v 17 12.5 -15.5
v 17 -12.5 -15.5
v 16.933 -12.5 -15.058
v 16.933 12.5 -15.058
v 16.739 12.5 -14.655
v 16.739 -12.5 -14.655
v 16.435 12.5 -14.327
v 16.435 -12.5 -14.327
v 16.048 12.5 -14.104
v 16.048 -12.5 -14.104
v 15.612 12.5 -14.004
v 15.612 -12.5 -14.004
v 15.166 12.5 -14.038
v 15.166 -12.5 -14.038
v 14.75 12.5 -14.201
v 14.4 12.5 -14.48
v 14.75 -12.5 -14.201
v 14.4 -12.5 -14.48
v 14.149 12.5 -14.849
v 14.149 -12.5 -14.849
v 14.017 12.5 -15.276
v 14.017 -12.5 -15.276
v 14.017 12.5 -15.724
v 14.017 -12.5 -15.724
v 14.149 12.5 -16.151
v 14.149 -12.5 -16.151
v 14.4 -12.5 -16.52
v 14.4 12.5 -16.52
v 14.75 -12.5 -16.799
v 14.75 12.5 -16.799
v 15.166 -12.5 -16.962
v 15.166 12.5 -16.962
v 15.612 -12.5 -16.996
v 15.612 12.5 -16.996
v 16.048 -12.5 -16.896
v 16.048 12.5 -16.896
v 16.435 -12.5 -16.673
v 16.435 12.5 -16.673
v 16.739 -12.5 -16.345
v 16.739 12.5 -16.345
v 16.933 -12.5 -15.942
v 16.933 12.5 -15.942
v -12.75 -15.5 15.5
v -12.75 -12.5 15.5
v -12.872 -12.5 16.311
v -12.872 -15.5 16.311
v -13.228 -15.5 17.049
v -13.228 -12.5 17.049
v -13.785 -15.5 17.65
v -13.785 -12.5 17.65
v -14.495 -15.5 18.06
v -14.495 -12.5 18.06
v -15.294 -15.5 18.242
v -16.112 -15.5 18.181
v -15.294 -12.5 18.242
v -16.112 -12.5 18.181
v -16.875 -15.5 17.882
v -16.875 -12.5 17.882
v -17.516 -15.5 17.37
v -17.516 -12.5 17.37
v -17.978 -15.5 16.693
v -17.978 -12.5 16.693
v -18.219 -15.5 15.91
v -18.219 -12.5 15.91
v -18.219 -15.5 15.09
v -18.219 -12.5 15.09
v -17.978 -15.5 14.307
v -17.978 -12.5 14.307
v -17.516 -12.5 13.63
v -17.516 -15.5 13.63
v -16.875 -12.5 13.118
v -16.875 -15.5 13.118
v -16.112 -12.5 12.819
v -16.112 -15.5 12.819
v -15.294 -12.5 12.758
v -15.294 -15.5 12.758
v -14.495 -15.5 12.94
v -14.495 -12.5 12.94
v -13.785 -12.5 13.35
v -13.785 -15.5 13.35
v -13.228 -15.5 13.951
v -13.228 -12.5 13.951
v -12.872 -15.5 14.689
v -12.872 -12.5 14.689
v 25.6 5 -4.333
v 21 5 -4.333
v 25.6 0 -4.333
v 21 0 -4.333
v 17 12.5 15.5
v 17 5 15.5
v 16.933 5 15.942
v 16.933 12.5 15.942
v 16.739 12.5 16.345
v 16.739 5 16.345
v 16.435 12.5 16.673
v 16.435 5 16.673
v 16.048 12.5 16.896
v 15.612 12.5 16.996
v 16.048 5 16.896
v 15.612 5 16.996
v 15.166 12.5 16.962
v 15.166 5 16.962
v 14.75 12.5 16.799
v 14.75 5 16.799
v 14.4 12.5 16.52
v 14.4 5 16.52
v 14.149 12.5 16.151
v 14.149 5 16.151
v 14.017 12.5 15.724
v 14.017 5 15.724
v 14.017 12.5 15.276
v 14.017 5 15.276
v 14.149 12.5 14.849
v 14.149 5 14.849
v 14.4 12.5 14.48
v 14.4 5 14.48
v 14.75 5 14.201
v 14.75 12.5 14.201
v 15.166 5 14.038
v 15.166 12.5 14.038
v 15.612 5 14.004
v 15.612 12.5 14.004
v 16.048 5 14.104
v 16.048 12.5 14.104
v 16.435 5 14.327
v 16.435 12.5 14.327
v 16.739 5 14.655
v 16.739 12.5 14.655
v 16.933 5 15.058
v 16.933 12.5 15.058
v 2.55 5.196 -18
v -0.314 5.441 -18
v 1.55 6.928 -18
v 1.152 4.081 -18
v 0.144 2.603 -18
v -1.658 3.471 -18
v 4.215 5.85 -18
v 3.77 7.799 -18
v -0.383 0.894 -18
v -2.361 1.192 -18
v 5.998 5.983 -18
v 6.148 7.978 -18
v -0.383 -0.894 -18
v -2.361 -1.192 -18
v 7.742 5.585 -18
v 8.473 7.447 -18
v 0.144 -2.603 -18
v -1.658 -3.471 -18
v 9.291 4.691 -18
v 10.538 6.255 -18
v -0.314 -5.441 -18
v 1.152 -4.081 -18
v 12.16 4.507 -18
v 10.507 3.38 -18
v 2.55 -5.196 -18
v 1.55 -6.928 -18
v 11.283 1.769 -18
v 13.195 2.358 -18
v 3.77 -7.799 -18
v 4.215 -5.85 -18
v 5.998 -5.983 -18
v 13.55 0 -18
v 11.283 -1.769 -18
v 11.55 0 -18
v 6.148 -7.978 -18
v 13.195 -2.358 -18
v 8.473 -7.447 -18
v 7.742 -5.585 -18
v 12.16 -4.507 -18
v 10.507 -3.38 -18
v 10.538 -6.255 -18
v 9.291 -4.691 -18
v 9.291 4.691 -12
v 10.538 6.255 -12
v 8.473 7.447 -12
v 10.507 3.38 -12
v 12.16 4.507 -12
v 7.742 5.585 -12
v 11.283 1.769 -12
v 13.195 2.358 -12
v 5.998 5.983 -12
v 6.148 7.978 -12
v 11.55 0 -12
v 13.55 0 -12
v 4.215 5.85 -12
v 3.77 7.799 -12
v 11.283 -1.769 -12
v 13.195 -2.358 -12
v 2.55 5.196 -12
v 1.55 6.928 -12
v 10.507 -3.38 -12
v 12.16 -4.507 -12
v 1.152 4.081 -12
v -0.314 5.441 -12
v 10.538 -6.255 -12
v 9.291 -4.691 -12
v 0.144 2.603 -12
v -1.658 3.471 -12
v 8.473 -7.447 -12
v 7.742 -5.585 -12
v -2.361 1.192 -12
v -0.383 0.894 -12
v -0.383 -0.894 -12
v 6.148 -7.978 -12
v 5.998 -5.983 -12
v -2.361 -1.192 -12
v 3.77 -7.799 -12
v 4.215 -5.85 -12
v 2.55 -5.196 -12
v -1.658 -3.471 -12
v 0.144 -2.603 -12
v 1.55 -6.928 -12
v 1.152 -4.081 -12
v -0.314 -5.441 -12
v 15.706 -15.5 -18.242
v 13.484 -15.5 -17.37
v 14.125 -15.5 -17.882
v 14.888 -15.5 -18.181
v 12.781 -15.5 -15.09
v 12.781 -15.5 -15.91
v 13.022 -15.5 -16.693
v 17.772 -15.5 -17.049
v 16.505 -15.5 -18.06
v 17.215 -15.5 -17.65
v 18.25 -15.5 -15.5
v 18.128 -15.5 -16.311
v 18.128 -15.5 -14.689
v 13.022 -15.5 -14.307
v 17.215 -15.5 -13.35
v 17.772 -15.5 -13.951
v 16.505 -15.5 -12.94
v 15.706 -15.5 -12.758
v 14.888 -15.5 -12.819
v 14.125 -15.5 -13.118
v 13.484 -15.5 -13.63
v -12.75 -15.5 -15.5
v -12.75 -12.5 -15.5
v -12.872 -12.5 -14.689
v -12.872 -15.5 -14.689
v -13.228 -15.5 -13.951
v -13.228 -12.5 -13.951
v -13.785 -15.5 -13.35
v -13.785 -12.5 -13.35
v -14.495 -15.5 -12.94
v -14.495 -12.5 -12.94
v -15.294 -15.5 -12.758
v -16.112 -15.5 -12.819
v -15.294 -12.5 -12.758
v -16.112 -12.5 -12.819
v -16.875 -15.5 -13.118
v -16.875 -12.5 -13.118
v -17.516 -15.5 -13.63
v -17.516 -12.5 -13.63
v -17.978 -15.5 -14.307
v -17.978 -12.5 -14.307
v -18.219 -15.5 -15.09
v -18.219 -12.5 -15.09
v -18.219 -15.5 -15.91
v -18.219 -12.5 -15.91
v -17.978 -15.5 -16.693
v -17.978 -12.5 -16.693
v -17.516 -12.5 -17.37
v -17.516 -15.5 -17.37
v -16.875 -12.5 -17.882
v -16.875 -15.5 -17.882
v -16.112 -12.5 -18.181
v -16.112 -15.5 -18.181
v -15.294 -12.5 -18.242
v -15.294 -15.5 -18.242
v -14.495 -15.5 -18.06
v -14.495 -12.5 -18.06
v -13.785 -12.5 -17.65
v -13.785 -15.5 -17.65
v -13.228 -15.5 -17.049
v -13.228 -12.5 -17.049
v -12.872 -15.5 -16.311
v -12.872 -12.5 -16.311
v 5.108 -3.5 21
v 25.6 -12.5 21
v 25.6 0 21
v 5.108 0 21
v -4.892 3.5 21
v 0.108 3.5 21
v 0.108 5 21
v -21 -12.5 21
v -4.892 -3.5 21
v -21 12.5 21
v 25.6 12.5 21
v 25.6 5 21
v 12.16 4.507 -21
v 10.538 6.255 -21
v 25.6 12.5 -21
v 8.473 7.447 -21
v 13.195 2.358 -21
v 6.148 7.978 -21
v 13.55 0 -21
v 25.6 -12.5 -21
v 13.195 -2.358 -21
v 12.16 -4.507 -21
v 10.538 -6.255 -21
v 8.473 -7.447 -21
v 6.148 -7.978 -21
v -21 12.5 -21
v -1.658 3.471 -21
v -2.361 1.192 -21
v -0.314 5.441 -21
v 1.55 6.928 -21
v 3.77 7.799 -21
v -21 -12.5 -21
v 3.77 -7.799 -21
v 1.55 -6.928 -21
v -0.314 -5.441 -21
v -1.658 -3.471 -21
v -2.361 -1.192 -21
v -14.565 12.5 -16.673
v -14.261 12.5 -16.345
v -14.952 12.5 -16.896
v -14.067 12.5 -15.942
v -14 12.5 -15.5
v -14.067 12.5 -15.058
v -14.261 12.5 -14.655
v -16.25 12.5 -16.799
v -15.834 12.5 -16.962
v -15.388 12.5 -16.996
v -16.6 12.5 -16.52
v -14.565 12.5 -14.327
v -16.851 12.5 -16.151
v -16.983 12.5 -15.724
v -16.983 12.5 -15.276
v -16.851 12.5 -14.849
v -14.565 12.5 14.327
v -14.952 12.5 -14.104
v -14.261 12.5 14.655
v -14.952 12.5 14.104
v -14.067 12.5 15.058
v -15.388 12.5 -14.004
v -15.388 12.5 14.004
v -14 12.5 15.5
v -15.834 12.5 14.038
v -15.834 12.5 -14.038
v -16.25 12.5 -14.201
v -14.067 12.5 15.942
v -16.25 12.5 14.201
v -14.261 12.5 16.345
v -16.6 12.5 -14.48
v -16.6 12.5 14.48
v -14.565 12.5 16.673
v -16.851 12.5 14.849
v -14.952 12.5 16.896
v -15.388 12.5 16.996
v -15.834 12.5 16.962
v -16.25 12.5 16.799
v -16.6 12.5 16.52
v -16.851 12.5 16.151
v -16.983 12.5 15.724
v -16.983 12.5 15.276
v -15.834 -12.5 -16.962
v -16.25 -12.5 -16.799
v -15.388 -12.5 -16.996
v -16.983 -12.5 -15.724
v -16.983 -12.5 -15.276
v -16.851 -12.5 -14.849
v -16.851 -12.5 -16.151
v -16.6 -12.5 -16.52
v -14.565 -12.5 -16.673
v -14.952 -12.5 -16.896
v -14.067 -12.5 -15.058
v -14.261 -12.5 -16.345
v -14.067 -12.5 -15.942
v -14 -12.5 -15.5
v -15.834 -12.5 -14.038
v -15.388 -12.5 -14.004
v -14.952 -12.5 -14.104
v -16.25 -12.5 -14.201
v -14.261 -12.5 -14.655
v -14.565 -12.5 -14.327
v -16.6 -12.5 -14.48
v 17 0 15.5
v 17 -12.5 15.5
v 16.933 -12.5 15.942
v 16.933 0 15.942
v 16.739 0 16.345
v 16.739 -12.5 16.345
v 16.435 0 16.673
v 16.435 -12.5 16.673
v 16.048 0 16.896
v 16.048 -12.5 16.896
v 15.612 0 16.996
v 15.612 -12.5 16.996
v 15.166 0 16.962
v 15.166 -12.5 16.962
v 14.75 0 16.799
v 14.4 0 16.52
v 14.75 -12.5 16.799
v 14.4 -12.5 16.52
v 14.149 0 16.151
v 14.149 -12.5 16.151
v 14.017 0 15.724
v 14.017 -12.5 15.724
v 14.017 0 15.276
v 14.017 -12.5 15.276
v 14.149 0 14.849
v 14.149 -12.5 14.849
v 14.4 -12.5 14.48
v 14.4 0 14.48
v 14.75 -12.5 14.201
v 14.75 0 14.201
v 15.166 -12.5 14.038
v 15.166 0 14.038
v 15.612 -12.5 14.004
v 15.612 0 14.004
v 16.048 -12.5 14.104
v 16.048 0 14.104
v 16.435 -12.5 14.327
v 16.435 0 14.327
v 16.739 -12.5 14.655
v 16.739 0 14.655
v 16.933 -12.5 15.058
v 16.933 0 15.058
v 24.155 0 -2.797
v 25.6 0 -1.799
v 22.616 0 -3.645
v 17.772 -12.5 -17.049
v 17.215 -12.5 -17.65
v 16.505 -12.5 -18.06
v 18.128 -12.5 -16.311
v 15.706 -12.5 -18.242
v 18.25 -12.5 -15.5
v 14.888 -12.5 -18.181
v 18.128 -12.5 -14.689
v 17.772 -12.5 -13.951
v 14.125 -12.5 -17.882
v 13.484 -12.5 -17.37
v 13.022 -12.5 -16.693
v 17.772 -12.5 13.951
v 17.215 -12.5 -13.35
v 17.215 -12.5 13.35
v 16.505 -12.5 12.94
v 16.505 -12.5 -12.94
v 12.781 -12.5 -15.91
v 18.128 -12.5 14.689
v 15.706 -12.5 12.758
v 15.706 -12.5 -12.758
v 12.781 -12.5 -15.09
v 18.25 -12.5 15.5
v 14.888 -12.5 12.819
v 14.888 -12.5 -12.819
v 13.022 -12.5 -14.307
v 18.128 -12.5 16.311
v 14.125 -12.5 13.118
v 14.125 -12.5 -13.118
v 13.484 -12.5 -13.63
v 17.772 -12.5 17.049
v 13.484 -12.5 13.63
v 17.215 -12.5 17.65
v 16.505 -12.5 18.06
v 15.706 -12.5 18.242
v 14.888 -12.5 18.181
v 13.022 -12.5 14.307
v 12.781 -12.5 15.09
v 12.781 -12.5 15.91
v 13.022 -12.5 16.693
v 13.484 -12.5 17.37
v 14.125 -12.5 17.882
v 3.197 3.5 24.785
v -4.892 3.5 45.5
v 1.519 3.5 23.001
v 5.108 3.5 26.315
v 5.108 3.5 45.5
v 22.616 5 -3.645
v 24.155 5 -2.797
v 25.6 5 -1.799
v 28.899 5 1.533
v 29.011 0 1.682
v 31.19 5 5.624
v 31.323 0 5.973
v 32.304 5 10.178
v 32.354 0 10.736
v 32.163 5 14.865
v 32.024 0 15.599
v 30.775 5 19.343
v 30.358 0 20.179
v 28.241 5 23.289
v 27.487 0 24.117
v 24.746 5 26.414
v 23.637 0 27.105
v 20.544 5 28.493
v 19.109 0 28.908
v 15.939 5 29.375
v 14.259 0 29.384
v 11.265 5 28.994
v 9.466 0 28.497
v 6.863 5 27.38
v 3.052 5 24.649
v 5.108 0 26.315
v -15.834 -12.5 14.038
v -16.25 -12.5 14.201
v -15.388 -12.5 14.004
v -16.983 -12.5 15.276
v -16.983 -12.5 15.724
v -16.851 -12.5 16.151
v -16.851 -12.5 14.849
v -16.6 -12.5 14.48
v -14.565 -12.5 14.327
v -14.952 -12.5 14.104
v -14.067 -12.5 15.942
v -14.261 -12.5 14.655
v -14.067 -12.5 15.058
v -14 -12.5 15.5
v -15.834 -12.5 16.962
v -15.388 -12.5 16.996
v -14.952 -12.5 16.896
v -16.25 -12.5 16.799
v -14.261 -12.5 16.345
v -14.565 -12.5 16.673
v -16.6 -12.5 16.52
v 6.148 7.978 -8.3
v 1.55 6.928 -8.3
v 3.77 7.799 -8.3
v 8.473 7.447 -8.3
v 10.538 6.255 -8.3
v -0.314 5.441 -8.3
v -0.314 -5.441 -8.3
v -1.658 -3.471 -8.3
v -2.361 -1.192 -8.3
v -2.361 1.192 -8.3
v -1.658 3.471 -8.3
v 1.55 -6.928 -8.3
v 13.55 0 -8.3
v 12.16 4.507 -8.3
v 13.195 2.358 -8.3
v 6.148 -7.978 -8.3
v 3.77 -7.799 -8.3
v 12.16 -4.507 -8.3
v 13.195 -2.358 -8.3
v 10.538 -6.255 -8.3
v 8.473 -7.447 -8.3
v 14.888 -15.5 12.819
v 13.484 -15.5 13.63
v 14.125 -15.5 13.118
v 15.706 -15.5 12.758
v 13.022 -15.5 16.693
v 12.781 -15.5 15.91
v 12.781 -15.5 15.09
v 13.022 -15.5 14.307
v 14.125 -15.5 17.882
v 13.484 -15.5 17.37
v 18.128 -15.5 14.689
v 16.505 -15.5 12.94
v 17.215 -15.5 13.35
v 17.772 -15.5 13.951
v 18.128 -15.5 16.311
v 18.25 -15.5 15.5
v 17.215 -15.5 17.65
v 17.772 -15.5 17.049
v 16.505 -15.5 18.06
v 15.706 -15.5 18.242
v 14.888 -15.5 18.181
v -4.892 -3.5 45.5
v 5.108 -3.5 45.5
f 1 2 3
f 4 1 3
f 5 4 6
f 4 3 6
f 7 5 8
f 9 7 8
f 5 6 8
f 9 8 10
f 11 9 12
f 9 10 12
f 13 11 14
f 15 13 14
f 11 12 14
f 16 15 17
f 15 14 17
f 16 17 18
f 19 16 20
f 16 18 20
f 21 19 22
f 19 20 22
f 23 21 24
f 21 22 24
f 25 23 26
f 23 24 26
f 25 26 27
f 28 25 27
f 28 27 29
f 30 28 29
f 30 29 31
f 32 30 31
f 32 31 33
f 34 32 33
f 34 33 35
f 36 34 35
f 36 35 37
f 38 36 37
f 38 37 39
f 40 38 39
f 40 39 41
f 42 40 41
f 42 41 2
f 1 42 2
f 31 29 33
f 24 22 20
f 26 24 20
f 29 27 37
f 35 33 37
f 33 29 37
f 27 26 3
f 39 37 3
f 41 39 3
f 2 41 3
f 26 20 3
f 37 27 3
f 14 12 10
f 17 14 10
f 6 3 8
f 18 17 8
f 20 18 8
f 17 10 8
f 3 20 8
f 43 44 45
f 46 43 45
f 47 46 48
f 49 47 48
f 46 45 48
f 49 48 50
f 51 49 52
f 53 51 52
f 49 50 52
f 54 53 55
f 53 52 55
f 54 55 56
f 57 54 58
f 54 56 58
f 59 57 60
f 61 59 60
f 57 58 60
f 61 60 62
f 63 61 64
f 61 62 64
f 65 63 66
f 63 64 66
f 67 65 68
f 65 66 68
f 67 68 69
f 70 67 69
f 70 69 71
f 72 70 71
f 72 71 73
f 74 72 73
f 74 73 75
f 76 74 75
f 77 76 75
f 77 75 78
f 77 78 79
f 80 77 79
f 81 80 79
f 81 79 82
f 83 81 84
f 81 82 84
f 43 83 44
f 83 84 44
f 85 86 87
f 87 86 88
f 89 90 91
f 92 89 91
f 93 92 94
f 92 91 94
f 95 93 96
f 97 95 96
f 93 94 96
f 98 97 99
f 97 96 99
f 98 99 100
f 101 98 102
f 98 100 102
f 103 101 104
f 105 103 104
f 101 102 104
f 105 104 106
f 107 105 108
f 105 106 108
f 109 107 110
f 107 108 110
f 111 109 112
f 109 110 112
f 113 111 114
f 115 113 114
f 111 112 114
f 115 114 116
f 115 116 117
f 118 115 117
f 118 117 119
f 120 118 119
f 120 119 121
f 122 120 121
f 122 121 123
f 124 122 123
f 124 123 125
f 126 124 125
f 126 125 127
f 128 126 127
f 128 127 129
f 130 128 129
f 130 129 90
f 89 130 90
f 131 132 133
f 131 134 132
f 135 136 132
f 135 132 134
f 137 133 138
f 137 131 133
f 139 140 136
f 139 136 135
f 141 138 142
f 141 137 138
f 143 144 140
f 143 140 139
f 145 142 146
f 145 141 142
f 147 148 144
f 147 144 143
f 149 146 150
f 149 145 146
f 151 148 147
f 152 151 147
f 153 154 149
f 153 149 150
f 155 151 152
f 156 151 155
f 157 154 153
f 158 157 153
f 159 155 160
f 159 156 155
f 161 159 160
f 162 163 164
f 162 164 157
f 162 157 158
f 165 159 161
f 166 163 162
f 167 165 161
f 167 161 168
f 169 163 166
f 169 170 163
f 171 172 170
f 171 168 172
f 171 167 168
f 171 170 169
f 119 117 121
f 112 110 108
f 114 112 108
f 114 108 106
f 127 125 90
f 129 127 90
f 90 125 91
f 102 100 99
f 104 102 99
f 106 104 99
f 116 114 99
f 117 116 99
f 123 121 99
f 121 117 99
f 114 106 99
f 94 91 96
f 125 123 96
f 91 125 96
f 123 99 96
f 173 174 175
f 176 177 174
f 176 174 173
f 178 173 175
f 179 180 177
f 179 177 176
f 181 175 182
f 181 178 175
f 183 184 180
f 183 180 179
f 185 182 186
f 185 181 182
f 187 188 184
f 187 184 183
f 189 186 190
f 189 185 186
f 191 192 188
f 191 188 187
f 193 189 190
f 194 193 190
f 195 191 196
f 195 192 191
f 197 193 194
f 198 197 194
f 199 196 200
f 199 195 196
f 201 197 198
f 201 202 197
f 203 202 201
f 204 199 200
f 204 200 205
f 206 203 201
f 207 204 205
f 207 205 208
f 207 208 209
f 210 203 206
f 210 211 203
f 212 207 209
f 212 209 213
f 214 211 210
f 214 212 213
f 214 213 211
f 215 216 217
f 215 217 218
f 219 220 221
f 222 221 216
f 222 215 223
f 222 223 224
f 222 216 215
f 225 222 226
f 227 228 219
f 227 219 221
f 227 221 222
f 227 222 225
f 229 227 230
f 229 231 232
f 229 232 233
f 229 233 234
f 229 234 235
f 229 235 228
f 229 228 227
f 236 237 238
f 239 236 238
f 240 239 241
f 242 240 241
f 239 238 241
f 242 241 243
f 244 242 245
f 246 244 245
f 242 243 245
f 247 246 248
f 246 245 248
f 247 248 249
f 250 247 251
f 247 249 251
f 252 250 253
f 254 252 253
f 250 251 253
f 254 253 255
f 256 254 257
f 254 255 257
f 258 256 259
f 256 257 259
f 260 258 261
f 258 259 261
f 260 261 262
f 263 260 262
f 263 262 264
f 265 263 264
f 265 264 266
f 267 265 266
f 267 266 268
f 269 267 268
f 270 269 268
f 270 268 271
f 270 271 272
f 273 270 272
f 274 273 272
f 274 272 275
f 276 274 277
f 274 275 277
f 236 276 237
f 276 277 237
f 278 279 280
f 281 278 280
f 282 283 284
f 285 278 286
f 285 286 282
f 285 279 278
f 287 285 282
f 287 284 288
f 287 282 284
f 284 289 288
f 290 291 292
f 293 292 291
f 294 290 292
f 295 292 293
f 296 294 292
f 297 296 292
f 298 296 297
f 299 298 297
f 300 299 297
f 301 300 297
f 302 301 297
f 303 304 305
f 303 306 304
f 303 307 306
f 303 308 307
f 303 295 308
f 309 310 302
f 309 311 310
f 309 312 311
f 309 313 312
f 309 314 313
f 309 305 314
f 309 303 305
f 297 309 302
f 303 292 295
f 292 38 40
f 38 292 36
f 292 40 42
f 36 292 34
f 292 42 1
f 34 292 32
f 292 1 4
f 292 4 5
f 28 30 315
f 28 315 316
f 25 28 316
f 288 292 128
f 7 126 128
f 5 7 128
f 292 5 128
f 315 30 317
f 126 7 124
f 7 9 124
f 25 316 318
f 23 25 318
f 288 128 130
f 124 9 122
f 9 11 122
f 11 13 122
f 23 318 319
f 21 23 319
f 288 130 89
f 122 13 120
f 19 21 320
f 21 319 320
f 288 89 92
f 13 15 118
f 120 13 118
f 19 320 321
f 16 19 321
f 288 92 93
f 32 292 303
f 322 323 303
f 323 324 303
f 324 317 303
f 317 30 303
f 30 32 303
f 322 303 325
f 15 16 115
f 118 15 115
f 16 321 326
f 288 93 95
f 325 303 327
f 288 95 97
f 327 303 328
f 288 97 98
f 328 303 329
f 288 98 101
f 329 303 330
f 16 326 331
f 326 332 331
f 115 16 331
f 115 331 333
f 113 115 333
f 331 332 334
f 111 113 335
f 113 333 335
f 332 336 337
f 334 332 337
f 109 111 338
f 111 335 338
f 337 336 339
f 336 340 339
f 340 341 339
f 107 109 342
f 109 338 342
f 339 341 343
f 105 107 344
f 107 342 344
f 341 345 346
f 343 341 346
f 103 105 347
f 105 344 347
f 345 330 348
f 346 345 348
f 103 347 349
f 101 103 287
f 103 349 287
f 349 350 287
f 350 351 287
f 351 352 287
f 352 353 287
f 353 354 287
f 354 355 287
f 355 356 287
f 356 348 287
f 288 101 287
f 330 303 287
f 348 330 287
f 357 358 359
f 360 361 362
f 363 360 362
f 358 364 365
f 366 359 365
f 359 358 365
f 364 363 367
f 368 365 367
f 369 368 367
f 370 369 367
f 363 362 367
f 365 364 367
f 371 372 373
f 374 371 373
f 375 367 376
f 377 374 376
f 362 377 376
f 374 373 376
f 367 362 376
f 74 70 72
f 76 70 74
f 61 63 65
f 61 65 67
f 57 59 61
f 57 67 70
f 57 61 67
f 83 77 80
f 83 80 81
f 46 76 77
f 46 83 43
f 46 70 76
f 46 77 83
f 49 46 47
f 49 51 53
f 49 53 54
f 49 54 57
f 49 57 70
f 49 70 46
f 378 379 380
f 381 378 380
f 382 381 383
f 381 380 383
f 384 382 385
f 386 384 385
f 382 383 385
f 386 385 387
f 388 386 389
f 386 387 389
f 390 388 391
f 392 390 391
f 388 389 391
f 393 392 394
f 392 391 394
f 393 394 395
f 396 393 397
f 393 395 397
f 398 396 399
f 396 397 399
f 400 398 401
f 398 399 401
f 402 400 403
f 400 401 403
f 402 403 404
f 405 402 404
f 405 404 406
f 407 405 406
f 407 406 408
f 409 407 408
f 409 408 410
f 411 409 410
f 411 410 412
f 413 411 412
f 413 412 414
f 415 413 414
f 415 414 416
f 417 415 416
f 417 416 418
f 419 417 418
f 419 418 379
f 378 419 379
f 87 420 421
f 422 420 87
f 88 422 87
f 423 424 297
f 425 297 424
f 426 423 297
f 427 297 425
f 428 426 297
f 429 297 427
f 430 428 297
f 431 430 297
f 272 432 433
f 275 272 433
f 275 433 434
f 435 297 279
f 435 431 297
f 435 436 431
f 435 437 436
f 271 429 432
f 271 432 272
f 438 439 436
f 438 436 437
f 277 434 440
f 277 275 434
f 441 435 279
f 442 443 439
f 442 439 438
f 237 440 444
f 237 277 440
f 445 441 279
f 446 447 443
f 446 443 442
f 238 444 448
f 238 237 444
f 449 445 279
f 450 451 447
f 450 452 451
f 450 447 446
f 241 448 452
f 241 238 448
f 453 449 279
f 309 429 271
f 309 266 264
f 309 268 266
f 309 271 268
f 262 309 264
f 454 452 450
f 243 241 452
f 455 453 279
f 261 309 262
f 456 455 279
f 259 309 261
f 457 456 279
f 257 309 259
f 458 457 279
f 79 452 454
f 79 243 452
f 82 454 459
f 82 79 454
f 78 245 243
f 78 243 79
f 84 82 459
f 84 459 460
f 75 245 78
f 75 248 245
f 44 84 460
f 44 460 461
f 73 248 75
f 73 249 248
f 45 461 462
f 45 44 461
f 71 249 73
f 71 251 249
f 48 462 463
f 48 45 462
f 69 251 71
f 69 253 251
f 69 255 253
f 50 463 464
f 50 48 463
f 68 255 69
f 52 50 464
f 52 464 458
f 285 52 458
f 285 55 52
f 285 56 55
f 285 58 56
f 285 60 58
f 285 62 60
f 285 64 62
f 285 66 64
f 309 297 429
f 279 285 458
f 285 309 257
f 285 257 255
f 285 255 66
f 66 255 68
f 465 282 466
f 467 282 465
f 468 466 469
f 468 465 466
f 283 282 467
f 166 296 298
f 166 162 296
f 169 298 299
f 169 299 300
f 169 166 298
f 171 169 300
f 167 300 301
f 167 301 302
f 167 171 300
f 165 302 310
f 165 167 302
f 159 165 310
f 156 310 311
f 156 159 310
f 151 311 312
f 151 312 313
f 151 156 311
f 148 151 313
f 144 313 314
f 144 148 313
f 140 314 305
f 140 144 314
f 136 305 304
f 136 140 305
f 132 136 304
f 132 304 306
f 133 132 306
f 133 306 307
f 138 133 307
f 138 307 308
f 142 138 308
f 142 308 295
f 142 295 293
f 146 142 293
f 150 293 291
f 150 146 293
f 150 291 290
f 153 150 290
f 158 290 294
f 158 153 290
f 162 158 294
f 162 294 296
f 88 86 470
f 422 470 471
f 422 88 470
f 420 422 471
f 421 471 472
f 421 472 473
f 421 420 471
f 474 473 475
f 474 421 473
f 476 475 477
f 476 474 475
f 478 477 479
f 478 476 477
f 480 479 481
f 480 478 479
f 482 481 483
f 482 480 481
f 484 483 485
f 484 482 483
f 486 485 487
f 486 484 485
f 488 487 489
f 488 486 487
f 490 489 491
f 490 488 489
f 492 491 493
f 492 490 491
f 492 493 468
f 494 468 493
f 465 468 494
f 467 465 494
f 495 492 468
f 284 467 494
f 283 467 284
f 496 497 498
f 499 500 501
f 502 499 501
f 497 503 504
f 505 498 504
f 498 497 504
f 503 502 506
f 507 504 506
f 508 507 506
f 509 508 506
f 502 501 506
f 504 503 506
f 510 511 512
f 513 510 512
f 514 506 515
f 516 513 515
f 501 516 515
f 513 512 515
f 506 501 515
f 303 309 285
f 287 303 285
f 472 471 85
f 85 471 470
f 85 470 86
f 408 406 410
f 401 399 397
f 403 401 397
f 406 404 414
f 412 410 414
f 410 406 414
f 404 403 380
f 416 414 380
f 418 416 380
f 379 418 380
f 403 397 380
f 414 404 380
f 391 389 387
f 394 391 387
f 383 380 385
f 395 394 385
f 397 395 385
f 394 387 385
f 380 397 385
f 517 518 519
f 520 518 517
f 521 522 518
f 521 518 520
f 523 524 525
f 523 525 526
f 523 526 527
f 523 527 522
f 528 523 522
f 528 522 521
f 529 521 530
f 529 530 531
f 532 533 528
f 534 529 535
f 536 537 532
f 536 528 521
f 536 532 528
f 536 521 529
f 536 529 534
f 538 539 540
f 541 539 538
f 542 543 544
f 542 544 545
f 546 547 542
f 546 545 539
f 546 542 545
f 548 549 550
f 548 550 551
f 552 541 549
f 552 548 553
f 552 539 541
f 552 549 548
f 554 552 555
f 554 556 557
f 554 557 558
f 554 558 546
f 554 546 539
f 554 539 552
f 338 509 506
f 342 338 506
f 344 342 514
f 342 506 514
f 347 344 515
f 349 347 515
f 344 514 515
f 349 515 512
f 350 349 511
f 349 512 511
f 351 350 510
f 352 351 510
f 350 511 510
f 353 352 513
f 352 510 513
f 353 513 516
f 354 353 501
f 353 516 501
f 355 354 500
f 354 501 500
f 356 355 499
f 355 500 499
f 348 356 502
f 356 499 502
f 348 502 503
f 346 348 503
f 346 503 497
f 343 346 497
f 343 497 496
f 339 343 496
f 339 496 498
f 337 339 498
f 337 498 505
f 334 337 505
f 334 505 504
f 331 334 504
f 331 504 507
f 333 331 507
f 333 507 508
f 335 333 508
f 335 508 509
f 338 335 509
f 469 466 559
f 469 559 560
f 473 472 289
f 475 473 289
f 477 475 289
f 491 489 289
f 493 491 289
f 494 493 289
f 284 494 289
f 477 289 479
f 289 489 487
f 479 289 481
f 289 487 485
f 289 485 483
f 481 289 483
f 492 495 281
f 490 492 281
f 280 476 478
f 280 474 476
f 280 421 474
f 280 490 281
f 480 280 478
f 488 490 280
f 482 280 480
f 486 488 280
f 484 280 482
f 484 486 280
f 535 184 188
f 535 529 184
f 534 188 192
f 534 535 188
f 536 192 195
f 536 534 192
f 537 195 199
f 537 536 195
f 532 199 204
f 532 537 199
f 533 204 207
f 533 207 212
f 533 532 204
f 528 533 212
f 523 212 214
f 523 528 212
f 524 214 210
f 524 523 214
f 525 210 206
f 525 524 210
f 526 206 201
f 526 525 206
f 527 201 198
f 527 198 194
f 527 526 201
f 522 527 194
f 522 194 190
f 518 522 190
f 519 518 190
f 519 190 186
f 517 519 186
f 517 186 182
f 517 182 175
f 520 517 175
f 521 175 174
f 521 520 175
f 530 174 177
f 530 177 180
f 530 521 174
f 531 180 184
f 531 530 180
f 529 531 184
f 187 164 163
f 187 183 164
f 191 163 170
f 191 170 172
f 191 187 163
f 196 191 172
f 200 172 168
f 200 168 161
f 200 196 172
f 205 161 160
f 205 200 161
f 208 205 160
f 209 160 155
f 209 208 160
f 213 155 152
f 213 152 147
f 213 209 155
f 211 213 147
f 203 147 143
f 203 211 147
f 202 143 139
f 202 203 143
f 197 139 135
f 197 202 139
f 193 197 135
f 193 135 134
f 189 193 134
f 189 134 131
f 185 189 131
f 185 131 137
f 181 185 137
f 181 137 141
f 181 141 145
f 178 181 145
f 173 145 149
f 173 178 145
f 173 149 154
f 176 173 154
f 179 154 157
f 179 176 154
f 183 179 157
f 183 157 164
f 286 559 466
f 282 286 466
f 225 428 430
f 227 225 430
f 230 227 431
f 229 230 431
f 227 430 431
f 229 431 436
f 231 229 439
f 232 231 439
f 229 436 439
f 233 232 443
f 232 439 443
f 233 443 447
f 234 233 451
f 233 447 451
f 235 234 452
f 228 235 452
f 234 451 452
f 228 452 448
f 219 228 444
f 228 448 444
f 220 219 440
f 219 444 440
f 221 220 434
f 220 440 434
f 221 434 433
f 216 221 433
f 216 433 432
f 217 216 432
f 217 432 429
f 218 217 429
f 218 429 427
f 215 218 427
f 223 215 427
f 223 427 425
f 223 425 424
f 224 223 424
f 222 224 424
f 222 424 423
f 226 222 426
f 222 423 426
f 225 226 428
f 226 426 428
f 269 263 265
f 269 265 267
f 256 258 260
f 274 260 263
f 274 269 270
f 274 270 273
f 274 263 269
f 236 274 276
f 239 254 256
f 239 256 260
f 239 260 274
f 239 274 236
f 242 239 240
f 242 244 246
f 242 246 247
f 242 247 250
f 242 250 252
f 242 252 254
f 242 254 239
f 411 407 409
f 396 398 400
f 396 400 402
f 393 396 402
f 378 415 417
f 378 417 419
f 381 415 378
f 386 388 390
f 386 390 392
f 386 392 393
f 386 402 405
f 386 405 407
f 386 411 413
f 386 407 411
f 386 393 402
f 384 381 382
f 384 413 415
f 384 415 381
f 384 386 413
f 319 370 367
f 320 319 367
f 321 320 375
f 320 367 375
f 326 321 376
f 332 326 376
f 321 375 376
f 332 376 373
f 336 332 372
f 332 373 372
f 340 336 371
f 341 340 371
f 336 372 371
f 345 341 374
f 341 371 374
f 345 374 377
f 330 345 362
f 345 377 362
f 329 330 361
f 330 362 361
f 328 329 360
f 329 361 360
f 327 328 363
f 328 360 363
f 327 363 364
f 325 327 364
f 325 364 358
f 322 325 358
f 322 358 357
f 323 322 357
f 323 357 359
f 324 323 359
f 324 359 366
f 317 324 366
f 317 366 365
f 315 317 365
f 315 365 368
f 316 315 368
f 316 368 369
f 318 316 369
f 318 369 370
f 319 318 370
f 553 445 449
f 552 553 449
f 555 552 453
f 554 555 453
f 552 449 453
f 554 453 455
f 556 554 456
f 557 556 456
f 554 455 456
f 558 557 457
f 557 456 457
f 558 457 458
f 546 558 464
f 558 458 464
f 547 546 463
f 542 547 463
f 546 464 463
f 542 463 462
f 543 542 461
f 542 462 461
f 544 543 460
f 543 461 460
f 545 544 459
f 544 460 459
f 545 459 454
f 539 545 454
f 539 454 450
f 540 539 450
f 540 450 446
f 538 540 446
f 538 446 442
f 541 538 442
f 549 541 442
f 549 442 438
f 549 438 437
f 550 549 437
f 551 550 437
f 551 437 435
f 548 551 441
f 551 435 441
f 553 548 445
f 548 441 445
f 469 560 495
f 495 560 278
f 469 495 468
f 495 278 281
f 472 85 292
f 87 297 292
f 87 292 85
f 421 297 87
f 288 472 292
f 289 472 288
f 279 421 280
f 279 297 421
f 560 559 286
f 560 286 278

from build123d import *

# Parameters (mm, degrees)
F0_W      = 42
F0_H      = 42
F1_DEPTH  = 12.5
F2_R      = 1.5
F3_DEPTH  = 25.001
F6_R      = 17.4
F7_DEPTH  = 5
F8_DEPTH  = 4.6
F9_W      = 10
F9_H      = 7
F10_DEPTH = 24.5
F11_R     = 2.75
F12_DEPTH = 3


with BuildPart() as f1:
    # F0 (on Front) → F1 (new body, symmetric)
    with BuildSketch(Plane.XZ):
        Rectangle(F0_W, F0_H)
    extrude(amount=F1_DEPTH, both=True)

    # F2 (on face) → F3 (cut, through all)
    with BuildSketch(Plane.XZ.offset(12.5)):
        with Locations((-15.5, 15.5)):
            Circle(F2_R)
        with Locations((15.5, 15.5)):
            Circle(F2_R)
        with Locations((-15.5, -15.5)):
            Circle(F2_R)
        with Locations((15.5, -15.5)):
            Circle(F2_R)
    extrude(amount=-F3_DEPTH, mode=Mode.SUBTRACT)

    # F4 (on Front) → F5 (revolve, cut)
    with BuildSketch(Plane.XZ):
        Polygon((13.55, -8.3), (5.55, -8.3), (5.55, -21), (13.55, -21), (13.55, -18), (11.55, -18), (11.55, -12), (13.55, -12), align=None)
    revolve(axis=Axis((5.55, 0, -42.7623434187), (0, 0, -1)), mode=Mode.SUBTRACT)

    # F6 (on Front) → F7 (join)
    with BuildSketch(Plane.XZ):
        with Locations((15, 12)):
            Circle(F6_R)
    extrude(amount=-F7_DEPTH)

    # F8 (add): a face of the model
    f8_faces = [f1.faces().sort_by_distance(p)[0] for p in [
        (21, -0.3429519104, -1.1432103634),
    ]]
    extrude(f8_faces, amount=F8_DEPTH)

    # F9 (on face) → F10 (join)
    with BuildSketch(Plane.XY.offset(21)):
        with Locations((0.1083916248, 0)):
            Rectangle(F9_W, F9_H)
    extrude(amount=F10_DEPTH)

    # F11 (on face) → F12 (join)
    with BuildSketch(Plane.XZ.offset(12.5)):
        with Locations((-15.5, 15.5)):
            Circle(F11_R)
        with Locations((-15.5, -15.5)):
            Circle(F11_R)
        with Locations((15.5, -15.5)):
            Circle(F11_R)
        with Locations((15.5, 15.5)):
            Circle(F11_R)
    extrude(amount=F12_DEPTH)


solid = f1.part
